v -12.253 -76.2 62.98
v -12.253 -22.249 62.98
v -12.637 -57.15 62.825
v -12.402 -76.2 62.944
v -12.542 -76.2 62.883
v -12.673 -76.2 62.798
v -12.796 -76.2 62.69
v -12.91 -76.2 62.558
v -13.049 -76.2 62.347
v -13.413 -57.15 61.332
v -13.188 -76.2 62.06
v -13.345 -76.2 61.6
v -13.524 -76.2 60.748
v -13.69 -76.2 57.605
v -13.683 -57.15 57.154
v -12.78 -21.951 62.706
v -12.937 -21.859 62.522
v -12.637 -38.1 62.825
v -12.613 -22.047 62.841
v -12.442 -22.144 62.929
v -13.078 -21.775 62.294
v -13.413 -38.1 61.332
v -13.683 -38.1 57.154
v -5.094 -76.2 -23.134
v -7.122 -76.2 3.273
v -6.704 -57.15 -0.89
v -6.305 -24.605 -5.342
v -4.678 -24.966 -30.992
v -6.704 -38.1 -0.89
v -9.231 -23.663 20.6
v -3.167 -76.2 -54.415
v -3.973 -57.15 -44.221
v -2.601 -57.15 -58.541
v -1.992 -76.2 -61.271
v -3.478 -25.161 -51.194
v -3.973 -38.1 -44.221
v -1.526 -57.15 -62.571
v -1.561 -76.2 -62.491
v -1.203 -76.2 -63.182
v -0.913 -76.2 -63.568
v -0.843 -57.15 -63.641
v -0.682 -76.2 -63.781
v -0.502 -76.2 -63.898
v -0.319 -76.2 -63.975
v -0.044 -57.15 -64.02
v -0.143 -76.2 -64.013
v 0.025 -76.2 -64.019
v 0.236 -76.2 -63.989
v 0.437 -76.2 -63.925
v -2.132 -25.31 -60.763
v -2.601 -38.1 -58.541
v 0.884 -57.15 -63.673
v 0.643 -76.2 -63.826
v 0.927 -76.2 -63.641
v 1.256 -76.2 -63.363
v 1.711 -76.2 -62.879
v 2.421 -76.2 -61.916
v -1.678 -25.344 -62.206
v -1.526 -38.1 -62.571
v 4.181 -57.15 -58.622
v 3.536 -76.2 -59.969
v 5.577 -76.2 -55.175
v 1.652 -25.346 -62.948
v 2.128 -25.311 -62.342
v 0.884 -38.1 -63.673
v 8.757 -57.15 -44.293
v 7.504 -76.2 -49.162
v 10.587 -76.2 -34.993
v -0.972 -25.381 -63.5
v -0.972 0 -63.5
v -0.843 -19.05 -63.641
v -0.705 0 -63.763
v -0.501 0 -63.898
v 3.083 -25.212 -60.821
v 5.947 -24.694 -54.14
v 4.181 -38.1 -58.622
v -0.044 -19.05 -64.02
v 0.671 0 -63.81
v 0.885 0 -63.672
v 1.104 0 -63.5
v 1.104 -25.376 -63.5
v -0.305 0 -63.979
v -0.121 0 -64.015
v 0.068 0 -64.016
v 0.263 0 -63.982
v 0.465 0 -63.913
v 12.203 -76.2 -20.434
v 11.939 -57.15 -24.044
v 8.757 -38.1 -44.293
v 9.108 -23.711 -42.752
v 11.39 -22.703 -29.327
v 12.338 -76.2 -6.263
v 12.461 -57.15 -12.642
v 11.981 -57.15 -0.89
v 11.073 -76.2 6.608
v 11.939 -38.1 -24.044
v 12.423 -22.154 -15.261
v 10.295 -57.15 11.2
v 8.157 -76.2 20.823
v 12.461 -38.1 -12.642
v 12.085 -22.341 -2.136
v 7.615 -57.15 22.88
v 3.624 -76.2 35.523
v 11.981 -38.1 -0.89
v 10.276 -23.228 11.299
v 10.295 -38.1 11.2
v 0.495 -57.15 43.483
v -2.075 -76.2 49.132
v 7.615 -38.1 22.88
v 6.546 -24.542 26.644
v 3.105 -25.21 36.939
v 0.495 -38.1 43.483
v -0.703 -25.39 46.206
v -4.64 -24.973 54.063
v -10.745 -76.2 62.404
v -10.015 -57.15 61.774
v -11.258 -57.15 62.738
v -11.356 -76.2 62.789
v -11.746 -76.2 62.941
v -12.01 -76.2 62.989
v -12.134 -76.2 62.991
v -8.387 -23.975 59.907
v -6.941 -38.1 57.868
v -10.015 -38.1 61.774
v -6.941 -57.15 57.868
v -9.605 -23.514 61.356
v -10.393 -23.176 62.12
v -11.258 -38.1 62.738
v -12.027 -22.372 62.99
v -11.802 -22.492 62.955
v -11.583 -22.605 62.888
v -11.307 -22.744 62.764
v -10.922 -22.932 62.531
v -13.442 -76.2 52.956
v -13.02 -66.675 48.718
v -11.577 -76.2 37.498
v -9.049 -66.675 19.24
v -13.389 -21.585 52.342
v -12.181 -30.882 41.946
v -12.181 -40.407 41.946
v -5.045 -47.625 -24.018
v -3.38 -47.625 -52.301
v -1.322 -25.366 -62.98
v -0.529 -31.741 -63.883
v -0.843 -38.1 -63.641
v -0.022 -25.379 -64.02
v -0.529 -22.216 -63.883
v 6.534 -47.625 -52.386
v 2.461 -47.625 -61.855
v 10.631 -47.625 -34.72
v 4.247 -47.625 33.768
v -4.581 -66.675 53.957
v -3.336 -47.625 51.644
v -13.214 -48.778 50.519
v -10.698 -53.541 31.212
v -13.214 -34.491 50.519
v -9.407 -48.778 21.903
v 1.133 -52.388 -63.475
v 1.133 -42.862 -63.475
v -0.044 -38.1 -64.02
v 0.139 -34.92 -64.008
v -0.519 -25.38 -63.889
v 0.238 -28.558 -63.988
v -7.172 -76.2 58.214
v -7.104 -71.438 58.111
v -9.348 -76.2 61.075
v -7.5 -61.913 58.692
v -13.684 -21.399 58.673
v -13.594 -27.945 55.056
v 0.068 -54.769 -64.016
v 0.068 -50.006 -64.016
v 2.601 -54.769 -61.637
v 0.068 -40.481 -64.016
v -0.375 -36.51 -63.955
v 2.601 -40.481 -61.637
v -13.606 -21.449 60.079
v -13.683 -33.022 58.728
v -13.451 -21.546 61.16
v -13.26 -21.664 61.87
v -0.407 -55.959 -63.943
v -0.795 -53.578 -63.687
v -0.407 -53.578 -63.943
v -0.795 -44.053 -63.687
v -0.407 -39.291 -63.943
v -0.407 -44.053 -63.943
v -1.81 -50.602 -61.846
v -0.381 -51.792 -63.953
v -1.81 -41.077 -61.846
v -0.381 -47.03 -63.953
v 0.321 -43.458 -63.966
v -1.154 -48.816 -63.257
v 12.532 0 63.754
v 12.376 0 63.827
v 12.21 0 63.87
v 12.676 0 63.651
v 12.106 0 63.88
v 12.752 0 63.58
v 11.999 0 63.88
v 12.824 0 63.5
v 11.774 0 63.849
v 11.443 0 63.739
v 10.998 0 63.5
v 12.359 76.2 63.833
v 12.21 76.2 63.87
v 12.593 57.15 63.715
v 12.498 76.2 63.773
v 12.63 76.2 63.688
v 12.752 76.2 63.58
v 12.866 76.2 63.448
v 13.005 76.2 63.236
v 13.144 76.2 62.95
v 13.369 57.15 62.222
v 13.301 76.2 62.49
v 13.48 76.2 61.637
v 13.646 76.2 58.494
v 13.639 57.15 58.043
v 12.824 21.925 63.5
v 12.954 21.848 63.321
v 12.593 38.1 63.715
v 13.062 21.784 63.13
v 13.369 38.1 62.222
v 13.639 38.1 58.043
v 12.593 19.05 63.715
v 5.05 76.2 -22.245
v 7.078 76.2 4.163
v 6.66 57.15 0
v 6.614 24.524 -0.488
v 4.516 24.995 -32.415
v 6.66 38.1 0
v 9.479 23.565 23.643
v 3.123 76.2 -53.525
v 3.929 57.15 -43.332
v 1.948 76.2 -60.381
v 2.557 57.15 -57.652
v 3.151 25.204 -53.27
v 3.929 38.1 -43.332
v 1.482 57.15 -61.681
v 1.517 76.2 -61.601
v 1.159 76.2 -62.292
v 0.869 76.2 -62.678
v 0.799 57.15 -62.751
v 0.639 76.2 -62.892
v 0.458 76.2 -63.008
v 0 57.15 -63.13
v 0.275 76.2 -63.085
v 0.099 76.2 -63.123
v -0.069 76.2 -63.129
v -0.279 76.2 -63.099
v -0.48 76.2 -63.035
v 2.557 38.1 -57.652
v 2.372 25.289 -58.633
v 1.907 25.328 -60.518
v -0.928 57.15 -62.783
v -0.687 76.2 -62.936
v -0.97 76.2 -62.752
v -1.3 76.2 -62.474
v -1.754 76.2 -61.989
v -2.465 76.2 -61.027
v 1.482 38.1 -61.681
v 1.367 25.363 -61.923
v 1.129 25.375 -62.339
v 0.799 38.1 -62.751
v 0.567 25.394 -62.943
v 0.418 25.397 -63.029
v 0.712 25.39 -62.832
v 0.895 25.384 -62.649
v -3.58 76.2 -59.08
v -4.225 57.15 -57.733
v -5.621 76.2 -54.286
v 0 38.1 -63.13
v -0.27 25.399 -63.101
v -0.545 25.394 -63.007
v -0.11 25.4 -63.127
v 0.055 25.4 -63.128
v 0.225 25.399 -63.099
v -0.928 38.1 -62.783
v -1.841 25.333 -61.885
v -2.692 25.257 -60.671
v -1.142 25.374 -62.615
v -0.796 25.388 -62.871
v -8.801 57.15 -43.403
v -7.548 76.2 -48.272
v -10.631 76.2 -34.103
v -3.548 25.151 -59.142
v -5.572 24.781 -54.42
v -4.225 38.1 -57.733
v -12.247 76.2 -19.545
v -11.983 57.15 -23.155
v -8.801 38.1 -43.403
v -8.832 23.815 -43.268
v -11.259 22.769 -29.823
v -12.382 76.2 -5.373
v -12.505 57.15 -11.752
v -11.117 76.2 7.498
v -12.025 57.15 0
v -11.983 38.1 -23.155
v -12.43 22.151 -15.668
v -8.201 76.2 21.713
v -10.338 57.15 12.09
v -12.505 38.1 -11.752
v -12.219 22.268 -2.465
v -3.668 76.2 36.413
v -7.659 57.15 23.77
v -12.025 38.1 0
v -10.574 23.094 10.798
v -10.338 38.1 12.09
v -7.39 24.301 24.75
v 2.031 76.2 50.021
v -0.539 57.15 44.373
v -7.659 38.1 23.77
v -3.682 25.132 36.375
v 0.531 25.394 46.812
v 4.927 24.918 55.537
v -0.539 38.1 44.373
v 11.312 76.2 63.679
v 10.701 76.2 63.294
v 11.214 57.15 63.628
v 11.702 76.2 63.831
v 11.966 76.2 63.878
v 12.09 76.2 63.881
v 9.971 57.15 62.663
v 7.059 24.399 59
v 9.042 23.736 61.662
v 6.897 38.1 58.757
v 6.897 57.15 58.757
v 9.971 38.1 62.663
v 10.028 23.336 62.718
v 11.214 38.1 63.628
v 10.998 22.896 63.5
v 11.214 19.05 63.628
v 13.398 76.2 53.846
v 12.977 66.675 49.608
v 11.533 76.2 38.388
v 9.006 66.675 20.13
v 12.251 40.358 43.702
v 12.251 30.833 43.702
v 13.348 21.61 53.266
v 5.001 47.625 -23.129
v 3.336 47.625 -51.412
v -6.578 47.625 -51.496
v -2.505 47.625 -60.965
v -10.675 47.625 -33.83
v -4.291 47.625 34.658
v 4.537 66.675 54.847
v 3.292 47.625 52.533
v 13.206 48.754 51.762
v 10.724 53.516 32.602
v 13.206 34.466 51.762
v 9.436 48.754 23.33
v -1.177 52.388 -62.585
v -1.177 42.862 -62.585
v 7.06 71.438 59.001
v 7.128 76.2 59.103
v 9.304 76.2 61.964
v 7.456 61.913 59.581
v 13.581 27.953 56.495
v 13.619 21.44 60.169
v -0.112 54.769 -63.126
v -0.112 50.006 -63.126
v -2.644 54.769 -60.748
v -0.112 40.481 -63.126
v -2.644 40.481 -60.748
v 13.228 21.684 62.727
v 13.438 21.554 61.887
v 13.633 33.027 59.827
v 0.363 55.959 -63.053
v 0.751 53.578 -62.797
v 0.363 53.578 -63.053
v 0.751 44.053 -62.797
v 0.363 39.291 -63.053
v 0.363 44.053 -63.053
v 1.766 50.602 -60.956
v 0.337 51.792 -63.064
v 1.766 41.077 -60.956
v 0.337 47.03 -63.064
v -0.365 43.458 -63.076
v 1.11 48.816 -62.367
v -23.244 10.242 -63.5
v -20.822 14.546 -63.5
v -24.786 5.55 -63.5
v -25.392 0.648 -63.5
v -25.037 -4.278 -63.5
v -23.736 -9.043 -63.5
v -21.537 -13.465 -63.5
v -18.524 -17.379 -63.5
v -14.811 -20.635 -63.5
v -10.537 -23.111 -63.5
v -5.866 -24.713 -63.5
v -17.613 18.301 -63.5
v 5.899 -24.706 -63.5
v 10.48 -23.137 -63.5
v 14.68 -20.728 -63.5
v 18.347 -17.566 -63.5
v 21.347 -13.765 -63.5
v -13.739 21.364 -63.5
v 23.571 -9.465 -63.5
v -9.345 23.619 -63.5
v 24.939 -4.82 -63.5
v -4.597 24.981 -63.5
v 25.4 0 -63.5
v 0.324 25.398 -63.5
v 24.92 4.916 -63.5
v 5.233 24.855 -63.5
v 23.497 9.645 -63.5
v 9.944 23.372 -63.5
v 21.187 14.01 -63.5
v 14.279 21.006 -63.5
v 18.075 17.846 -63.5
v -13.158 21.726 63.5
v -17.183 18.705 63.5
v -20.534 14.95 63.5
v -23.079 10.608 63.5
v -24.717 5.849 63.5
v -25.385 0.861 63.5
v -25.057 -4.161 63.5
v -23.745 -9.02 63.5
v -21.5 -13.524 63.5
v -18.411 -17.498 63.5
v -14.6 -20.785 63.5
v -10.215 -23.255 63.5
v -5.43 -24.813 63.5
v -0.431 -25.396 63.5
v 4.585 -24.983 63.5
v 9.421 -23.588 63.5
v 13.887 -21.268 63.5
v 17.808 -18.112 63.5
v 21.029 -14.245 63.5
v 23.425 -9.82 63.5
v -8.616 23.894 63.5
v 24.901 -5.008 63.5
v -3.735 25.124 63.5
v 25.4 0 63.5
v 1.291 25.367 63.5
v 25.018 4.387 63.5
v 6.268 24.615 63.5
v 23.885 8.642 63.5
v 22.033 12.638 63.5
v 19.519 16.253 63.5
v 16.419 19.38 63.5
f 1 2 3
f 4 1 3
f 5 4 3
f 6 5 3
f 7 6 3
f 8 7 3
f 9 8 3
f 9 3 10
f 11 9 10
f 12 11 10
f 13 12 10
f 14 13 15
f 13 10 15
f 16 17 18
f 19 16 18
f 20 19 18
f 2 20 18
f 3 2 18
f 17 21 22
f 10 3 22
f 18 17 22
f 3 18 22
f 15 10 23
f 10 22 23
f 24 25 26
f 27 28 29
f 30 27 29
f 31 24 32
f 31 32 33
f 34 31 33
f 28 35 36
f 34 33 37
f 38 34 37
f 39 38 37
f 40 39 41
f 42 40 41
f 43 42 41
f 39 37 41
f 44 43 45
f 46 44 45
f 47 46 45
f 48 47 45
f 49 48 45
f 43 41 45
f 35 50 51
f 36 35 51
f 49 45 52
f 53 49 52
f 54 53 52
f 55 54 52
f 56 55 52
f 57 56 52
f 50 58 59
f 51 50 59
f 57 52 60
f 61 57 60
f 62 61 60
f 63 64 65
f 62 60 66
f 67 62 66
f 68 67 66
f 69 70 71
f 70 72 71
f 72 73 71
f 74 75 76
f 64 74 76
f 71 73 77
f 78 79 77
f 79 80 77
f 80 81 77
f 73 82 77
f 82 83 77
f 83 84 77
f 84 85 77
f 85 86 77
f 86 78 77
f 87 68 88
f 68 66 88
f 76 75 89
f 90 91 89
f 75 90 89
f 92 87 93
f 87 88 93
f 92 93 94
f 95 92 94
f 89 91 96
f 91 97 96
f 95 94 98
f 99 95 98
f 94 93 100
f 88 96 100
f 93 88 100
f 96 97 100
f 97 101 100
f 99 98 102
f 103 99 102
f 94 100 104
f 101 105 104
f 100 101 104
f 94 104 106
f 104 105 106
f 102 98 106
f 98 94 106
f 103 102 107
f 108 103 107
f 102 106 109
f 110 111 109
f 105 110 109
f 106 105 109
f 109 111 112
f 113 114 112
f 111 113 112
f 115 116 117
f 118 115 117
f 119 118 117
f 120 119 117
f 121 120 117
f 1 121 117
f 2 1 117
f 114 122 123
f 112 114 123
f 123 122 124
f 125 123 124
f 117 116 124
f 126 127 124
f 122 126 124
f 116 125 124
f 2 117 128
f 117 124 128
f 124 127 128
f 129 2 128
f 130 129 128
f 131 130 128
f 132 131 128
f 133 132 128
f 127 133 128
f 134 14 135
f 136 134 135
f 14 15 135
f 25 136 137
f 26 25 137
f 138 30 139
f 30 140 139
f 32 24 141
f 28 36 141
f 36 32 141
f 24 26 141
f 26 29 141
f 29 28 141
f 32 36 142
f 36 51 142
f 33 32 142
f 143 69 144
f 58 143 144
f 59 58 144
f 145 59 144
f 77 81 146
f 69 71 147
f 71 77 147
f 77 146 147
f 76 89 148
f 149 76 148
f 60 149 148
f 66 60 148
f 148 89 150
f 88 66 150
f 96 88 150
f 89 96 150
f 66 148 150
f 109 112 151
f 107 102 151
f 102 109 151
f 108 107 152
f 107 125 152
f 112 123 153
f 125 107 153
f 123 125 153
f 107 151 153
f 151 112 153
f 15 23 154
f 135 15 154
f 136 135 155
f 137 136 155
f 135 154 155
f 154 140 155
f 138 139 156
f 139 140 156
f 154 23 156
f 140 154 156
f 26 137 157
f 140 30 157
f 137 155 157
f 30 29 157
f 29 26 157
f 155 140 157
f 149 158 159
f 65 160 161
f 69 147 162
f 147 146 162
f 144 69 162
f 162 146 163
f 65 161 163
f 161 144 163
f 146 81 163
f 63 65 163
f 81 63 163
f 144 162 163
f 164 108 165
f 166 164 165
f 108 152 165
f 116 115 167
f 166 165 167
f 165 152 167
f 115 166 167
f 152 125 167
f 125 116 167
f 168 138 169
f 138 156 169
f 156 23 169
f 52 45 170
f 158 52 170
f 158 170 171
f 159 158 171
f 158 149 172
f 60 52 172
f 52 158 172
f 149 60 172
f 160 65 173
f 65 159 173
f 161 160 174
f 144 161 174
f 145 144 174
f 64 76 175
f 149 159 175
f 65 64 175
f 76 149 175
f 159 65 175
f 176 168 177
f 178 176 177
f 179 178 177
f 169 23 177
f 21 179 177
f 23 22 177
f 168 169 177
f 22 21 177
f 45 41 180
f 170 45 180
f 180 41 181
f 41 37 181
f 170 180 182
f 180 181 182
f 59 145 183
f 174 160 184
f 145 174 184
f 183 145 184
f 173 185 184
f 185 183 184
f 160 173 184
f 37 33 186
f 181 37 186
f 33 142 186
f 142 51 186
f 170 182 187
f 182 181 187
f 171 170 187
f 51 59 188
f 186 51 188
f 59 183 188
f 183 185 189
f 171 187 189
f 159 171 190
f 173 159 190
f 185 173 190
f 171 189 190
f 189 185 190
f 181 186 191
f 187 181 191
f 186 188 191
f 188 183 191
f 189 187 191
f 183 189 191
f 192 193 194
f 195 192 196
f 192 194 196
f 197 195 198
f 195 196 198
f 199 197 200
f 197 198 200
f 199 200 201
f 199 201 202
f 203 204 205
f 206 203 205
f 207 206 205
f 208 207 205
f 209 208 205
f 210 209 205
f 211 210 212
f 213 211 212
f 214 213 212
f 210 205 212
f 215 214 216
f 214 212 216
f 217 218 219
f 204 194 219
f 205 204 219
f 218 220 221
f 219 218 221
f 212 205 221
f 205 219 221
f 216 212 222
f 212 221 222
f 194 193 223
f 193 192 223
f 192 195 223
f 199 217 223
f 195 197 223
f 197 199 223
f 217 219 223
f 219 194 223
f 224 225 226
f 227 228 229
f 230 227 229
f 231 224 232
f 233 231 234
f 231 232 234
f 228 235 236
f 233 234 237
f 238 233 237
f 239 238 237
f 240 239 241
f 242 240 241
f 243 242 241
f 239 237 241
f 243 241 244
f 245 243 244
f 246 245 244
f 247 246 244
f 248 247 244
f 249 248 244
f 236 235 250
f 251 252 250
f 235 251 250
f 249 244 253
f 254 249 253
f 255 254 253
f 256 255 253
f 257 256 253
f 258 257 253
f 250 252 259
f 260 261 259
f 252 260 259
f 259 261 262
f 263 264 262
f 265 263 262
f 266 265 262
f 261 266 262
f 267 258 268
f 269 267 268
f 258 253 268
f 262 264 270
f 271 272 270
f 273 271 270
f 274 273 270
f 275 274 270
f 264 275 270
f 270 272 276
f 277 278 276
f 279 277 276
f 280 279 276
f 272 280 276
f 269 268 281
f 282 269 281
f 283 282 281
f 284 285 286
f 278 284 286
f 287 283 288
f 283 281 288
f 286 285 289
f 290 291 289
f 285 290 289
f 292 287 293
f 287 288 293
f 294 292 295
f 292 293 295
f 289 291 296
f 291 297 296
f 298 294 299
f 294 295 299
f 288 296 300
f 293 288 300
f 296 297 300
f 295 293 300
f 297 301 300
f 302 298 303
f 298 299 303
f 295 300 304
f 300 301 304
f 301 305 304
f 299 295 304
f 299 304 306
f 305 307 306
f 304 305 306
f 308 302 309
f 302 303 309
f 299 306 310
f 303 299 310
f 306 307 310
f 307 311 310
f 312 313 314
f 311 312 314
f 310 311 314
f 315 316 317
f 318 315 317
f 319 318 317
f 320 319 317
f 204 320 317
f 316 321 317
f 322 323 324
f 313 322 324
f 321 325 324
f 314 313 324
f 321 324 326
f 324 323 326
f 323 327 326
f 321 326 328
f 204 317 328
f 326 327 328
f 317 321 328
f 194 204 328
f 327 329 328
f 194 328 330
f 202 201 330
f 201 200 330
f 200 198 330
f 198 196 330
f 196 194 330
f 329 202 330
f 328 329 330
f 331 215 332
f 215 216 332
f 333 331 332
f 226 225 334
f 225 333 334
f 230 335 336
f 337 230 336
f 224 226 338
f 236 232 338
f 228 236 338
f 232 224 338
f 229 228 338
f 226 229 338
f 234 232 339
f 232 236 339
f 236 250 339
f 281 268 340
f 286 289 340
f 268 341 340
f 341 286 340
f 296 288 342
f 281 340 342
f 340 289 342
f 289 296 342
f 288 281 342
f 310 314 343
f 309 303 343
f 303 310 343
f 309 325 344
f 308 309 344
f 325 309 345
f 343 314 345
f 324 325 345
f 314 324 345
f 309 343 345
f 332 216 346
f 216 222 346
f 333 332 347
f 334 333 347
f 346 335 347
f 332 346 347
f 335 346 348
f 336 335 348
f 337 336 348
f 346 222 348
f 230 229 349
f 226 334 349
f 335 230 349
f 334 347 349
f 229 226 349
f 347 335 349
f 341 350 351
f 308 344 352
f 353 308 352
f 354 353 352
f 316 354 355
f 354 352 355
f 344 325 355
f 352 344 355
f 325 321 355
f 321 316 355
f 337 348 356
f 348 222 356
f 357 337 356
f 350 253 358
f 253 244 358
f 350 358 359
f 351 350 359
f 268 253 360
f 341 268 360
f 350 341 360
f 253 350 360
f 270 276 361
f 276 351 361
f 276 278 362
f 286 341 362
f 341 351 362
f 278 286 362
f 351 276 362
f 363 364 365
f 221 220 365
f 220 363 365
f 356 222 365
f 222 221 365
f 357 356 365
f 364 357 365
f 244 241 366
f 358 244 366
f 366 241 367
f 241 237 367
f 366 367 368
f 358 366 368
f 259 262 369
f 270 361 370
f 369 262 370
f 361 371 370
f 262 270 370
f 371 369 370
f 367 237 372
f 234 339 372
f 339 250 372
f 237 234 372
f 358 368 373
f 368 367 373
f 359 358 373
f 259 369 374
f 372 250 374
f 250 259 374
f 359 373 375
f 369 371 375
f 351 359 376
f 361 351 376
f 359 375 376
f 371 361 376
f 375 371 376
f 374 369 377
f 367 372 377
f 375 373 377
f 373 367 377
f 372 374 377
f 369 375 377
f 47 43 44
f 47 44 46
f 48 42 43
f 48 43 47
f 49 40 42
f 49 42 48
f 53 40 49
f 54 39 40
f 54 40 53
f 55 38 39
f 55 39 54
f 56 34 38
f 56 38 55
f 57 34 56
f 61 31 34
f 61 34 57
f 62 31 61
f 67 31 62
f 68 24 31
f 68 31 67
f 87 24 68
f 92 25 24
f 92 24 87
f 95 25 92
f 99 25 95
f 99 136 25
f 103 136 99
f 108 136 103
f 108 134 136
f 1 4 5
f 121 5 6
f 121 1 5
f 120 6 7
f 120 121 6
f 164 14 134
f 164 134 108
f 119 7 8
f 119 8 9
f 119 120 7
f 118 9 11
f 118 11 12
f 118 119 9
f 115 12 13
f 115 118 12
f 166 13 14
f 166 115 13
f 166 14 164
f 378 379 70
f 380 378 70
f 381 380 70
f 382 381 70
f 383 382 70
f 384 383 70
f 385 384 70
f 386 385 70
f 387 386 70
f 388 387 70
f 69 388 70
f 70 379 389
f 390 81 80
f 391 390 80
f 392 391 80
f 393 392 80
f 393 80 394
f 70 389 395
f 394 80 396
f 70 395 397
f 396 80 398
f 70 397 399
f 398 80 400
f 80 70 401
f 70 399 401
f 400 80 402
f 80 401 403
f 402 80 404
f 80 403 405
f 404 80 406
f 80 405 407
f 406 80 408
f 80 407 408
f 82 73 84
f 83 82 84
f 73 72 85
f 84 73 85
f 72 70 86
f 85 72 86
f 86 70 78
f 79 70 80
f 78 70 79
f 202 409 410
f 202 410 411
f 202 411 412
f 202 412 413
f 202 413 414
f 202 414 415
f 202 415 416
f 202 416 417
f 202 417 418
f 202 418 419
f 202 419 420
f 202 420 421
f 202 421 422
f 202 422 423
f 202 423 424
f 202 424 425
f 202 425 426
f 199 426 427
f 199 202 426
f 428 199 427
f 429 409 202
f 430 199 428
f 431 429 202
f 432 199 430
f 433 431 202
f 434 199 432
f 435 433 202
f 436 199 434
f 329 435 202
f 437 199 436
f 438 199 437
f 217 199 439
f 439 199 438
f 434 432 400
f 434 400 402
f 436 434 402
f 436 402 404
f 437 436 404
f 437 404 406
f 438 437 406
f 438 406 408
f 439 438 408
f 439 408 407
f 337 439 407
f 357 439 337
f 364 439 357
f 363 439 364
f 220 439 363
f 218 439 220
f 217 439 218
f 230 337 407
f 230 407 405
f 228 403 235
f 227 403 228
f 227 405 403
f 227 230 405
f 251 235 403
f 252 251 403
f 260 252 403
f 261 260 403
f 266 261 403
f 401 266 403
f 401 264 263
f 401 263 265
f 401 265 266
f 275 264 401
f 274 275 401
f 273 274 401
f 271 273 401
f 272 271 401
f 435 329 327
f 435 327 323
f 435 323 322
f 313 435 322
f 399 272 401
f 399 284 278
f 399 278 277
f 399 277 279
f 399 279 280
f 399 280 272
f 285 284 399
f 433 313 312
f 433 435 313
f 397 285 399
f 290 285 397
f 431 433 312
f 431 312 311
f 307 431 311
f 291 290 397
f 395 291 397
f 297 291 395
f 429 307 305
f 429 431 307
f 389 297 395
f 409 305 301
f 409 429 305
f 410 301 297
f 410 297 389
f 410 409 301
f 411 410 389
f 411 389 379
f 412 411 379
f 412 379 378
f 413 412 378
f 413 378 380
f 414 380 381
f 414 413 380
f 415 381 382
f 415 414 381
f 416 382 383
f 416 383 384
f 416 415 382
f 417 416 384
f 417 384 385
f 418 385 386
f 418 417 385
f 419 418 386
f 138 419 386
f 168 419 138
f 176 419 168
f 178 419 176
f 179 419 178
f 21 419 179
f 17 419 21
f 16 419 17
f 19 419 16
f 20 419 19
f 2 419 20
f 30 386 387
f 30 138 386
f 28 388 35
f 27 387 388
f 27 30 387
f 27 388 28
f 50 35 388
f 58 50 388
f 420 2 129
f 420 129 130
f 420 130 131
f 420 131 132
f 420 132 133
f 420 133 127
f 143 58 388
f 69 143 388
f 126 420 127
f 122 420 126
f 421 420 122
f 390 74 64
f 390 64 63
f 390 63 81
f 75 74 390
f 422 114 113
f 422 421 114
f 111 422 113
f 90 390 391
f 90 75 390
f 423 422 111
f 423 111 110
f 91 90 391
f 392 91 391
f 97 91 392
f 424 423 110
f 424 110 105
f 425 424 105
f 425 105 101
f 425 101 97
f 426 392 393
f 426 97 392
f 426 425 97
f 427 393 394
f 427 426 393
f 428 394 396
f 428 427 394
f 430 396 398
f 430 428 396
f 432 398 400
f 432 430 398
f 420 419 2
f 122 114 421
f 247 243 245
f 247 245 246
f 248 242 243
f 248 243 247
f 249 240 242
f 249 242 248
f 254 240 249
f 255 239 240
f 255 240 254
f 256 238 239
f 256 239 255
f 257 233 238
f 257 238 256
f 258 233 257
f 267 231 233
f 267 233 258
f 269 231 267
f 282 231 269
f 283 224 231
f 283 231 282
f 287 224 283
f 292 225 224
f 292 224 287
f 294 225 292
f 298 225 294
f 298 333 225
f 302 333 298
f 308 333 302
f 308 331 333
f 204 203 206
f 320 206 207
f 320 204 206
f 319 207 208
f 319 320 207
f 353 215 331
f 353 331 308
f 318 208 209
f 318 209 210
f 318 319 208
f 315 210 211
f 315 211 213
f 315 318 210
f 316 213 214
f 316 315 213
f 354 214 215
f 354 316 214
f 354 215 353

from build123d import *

# Parameters (mm, degrees)
F0_R     = 25.4
F1_DEPTH = 63.5
F3_DEPTH = 76.2
F5_DEPTH = 76.2


with BuildPart() as f1:
    # F0 (on Top) → F1 (new body, symmetric)
    with BuildSketch(Plane.XY):
        Circle(F0_R)
    extrude(amount=F1_DEPTH, both=True)

    # F2 (on Front) → F3 (join)
    with BuildSketch(Plane.XZ):
        with BuildLine():
            add(Edge.make_bspline(
                [(12.2096184641, 63.8697233594), (16.6497383952, 63.1711558384), (2.7274043199, 0.2429049392), (5.5307772535, -94.7888159247), (-25.3704704033, 1.2698705528), (7.6262838241, 64.5908229618), (12.2096184641, 63.8697233594)],
                knots=[0, 0, 0, 0, 0.2482290236, 0.4952357659, 0.7437644253, 1, 1, 1, 1], degree=3))
        make_face()
    extrude(amount=-F3_DEPTH)

    # F4 (on Front) → F5 (join)
    with BuildSketch(Plane.XZ):
        with BuildLine():
            add(Edge.make_bspline(
                [(-12.2534717744, 62.9801180998), (-16.6935917055, 62.2815505789), (-2.7712576302, -0.6467003203), (-5.5746305637, -95.6784211842), (25.3266170931, 0.3802652933), (-7.6701371343, 63.7012177023), (-12.2534717744, 62.9801180998)],
                knots=[0, 0, 0, 0, 0.2482290236, 0.4952357659, 0.7437644253, 1, 1, 1, 1], degree=3))
        make_face()
    extrude(amount=F5_DEPTH)


solid = f1.part
